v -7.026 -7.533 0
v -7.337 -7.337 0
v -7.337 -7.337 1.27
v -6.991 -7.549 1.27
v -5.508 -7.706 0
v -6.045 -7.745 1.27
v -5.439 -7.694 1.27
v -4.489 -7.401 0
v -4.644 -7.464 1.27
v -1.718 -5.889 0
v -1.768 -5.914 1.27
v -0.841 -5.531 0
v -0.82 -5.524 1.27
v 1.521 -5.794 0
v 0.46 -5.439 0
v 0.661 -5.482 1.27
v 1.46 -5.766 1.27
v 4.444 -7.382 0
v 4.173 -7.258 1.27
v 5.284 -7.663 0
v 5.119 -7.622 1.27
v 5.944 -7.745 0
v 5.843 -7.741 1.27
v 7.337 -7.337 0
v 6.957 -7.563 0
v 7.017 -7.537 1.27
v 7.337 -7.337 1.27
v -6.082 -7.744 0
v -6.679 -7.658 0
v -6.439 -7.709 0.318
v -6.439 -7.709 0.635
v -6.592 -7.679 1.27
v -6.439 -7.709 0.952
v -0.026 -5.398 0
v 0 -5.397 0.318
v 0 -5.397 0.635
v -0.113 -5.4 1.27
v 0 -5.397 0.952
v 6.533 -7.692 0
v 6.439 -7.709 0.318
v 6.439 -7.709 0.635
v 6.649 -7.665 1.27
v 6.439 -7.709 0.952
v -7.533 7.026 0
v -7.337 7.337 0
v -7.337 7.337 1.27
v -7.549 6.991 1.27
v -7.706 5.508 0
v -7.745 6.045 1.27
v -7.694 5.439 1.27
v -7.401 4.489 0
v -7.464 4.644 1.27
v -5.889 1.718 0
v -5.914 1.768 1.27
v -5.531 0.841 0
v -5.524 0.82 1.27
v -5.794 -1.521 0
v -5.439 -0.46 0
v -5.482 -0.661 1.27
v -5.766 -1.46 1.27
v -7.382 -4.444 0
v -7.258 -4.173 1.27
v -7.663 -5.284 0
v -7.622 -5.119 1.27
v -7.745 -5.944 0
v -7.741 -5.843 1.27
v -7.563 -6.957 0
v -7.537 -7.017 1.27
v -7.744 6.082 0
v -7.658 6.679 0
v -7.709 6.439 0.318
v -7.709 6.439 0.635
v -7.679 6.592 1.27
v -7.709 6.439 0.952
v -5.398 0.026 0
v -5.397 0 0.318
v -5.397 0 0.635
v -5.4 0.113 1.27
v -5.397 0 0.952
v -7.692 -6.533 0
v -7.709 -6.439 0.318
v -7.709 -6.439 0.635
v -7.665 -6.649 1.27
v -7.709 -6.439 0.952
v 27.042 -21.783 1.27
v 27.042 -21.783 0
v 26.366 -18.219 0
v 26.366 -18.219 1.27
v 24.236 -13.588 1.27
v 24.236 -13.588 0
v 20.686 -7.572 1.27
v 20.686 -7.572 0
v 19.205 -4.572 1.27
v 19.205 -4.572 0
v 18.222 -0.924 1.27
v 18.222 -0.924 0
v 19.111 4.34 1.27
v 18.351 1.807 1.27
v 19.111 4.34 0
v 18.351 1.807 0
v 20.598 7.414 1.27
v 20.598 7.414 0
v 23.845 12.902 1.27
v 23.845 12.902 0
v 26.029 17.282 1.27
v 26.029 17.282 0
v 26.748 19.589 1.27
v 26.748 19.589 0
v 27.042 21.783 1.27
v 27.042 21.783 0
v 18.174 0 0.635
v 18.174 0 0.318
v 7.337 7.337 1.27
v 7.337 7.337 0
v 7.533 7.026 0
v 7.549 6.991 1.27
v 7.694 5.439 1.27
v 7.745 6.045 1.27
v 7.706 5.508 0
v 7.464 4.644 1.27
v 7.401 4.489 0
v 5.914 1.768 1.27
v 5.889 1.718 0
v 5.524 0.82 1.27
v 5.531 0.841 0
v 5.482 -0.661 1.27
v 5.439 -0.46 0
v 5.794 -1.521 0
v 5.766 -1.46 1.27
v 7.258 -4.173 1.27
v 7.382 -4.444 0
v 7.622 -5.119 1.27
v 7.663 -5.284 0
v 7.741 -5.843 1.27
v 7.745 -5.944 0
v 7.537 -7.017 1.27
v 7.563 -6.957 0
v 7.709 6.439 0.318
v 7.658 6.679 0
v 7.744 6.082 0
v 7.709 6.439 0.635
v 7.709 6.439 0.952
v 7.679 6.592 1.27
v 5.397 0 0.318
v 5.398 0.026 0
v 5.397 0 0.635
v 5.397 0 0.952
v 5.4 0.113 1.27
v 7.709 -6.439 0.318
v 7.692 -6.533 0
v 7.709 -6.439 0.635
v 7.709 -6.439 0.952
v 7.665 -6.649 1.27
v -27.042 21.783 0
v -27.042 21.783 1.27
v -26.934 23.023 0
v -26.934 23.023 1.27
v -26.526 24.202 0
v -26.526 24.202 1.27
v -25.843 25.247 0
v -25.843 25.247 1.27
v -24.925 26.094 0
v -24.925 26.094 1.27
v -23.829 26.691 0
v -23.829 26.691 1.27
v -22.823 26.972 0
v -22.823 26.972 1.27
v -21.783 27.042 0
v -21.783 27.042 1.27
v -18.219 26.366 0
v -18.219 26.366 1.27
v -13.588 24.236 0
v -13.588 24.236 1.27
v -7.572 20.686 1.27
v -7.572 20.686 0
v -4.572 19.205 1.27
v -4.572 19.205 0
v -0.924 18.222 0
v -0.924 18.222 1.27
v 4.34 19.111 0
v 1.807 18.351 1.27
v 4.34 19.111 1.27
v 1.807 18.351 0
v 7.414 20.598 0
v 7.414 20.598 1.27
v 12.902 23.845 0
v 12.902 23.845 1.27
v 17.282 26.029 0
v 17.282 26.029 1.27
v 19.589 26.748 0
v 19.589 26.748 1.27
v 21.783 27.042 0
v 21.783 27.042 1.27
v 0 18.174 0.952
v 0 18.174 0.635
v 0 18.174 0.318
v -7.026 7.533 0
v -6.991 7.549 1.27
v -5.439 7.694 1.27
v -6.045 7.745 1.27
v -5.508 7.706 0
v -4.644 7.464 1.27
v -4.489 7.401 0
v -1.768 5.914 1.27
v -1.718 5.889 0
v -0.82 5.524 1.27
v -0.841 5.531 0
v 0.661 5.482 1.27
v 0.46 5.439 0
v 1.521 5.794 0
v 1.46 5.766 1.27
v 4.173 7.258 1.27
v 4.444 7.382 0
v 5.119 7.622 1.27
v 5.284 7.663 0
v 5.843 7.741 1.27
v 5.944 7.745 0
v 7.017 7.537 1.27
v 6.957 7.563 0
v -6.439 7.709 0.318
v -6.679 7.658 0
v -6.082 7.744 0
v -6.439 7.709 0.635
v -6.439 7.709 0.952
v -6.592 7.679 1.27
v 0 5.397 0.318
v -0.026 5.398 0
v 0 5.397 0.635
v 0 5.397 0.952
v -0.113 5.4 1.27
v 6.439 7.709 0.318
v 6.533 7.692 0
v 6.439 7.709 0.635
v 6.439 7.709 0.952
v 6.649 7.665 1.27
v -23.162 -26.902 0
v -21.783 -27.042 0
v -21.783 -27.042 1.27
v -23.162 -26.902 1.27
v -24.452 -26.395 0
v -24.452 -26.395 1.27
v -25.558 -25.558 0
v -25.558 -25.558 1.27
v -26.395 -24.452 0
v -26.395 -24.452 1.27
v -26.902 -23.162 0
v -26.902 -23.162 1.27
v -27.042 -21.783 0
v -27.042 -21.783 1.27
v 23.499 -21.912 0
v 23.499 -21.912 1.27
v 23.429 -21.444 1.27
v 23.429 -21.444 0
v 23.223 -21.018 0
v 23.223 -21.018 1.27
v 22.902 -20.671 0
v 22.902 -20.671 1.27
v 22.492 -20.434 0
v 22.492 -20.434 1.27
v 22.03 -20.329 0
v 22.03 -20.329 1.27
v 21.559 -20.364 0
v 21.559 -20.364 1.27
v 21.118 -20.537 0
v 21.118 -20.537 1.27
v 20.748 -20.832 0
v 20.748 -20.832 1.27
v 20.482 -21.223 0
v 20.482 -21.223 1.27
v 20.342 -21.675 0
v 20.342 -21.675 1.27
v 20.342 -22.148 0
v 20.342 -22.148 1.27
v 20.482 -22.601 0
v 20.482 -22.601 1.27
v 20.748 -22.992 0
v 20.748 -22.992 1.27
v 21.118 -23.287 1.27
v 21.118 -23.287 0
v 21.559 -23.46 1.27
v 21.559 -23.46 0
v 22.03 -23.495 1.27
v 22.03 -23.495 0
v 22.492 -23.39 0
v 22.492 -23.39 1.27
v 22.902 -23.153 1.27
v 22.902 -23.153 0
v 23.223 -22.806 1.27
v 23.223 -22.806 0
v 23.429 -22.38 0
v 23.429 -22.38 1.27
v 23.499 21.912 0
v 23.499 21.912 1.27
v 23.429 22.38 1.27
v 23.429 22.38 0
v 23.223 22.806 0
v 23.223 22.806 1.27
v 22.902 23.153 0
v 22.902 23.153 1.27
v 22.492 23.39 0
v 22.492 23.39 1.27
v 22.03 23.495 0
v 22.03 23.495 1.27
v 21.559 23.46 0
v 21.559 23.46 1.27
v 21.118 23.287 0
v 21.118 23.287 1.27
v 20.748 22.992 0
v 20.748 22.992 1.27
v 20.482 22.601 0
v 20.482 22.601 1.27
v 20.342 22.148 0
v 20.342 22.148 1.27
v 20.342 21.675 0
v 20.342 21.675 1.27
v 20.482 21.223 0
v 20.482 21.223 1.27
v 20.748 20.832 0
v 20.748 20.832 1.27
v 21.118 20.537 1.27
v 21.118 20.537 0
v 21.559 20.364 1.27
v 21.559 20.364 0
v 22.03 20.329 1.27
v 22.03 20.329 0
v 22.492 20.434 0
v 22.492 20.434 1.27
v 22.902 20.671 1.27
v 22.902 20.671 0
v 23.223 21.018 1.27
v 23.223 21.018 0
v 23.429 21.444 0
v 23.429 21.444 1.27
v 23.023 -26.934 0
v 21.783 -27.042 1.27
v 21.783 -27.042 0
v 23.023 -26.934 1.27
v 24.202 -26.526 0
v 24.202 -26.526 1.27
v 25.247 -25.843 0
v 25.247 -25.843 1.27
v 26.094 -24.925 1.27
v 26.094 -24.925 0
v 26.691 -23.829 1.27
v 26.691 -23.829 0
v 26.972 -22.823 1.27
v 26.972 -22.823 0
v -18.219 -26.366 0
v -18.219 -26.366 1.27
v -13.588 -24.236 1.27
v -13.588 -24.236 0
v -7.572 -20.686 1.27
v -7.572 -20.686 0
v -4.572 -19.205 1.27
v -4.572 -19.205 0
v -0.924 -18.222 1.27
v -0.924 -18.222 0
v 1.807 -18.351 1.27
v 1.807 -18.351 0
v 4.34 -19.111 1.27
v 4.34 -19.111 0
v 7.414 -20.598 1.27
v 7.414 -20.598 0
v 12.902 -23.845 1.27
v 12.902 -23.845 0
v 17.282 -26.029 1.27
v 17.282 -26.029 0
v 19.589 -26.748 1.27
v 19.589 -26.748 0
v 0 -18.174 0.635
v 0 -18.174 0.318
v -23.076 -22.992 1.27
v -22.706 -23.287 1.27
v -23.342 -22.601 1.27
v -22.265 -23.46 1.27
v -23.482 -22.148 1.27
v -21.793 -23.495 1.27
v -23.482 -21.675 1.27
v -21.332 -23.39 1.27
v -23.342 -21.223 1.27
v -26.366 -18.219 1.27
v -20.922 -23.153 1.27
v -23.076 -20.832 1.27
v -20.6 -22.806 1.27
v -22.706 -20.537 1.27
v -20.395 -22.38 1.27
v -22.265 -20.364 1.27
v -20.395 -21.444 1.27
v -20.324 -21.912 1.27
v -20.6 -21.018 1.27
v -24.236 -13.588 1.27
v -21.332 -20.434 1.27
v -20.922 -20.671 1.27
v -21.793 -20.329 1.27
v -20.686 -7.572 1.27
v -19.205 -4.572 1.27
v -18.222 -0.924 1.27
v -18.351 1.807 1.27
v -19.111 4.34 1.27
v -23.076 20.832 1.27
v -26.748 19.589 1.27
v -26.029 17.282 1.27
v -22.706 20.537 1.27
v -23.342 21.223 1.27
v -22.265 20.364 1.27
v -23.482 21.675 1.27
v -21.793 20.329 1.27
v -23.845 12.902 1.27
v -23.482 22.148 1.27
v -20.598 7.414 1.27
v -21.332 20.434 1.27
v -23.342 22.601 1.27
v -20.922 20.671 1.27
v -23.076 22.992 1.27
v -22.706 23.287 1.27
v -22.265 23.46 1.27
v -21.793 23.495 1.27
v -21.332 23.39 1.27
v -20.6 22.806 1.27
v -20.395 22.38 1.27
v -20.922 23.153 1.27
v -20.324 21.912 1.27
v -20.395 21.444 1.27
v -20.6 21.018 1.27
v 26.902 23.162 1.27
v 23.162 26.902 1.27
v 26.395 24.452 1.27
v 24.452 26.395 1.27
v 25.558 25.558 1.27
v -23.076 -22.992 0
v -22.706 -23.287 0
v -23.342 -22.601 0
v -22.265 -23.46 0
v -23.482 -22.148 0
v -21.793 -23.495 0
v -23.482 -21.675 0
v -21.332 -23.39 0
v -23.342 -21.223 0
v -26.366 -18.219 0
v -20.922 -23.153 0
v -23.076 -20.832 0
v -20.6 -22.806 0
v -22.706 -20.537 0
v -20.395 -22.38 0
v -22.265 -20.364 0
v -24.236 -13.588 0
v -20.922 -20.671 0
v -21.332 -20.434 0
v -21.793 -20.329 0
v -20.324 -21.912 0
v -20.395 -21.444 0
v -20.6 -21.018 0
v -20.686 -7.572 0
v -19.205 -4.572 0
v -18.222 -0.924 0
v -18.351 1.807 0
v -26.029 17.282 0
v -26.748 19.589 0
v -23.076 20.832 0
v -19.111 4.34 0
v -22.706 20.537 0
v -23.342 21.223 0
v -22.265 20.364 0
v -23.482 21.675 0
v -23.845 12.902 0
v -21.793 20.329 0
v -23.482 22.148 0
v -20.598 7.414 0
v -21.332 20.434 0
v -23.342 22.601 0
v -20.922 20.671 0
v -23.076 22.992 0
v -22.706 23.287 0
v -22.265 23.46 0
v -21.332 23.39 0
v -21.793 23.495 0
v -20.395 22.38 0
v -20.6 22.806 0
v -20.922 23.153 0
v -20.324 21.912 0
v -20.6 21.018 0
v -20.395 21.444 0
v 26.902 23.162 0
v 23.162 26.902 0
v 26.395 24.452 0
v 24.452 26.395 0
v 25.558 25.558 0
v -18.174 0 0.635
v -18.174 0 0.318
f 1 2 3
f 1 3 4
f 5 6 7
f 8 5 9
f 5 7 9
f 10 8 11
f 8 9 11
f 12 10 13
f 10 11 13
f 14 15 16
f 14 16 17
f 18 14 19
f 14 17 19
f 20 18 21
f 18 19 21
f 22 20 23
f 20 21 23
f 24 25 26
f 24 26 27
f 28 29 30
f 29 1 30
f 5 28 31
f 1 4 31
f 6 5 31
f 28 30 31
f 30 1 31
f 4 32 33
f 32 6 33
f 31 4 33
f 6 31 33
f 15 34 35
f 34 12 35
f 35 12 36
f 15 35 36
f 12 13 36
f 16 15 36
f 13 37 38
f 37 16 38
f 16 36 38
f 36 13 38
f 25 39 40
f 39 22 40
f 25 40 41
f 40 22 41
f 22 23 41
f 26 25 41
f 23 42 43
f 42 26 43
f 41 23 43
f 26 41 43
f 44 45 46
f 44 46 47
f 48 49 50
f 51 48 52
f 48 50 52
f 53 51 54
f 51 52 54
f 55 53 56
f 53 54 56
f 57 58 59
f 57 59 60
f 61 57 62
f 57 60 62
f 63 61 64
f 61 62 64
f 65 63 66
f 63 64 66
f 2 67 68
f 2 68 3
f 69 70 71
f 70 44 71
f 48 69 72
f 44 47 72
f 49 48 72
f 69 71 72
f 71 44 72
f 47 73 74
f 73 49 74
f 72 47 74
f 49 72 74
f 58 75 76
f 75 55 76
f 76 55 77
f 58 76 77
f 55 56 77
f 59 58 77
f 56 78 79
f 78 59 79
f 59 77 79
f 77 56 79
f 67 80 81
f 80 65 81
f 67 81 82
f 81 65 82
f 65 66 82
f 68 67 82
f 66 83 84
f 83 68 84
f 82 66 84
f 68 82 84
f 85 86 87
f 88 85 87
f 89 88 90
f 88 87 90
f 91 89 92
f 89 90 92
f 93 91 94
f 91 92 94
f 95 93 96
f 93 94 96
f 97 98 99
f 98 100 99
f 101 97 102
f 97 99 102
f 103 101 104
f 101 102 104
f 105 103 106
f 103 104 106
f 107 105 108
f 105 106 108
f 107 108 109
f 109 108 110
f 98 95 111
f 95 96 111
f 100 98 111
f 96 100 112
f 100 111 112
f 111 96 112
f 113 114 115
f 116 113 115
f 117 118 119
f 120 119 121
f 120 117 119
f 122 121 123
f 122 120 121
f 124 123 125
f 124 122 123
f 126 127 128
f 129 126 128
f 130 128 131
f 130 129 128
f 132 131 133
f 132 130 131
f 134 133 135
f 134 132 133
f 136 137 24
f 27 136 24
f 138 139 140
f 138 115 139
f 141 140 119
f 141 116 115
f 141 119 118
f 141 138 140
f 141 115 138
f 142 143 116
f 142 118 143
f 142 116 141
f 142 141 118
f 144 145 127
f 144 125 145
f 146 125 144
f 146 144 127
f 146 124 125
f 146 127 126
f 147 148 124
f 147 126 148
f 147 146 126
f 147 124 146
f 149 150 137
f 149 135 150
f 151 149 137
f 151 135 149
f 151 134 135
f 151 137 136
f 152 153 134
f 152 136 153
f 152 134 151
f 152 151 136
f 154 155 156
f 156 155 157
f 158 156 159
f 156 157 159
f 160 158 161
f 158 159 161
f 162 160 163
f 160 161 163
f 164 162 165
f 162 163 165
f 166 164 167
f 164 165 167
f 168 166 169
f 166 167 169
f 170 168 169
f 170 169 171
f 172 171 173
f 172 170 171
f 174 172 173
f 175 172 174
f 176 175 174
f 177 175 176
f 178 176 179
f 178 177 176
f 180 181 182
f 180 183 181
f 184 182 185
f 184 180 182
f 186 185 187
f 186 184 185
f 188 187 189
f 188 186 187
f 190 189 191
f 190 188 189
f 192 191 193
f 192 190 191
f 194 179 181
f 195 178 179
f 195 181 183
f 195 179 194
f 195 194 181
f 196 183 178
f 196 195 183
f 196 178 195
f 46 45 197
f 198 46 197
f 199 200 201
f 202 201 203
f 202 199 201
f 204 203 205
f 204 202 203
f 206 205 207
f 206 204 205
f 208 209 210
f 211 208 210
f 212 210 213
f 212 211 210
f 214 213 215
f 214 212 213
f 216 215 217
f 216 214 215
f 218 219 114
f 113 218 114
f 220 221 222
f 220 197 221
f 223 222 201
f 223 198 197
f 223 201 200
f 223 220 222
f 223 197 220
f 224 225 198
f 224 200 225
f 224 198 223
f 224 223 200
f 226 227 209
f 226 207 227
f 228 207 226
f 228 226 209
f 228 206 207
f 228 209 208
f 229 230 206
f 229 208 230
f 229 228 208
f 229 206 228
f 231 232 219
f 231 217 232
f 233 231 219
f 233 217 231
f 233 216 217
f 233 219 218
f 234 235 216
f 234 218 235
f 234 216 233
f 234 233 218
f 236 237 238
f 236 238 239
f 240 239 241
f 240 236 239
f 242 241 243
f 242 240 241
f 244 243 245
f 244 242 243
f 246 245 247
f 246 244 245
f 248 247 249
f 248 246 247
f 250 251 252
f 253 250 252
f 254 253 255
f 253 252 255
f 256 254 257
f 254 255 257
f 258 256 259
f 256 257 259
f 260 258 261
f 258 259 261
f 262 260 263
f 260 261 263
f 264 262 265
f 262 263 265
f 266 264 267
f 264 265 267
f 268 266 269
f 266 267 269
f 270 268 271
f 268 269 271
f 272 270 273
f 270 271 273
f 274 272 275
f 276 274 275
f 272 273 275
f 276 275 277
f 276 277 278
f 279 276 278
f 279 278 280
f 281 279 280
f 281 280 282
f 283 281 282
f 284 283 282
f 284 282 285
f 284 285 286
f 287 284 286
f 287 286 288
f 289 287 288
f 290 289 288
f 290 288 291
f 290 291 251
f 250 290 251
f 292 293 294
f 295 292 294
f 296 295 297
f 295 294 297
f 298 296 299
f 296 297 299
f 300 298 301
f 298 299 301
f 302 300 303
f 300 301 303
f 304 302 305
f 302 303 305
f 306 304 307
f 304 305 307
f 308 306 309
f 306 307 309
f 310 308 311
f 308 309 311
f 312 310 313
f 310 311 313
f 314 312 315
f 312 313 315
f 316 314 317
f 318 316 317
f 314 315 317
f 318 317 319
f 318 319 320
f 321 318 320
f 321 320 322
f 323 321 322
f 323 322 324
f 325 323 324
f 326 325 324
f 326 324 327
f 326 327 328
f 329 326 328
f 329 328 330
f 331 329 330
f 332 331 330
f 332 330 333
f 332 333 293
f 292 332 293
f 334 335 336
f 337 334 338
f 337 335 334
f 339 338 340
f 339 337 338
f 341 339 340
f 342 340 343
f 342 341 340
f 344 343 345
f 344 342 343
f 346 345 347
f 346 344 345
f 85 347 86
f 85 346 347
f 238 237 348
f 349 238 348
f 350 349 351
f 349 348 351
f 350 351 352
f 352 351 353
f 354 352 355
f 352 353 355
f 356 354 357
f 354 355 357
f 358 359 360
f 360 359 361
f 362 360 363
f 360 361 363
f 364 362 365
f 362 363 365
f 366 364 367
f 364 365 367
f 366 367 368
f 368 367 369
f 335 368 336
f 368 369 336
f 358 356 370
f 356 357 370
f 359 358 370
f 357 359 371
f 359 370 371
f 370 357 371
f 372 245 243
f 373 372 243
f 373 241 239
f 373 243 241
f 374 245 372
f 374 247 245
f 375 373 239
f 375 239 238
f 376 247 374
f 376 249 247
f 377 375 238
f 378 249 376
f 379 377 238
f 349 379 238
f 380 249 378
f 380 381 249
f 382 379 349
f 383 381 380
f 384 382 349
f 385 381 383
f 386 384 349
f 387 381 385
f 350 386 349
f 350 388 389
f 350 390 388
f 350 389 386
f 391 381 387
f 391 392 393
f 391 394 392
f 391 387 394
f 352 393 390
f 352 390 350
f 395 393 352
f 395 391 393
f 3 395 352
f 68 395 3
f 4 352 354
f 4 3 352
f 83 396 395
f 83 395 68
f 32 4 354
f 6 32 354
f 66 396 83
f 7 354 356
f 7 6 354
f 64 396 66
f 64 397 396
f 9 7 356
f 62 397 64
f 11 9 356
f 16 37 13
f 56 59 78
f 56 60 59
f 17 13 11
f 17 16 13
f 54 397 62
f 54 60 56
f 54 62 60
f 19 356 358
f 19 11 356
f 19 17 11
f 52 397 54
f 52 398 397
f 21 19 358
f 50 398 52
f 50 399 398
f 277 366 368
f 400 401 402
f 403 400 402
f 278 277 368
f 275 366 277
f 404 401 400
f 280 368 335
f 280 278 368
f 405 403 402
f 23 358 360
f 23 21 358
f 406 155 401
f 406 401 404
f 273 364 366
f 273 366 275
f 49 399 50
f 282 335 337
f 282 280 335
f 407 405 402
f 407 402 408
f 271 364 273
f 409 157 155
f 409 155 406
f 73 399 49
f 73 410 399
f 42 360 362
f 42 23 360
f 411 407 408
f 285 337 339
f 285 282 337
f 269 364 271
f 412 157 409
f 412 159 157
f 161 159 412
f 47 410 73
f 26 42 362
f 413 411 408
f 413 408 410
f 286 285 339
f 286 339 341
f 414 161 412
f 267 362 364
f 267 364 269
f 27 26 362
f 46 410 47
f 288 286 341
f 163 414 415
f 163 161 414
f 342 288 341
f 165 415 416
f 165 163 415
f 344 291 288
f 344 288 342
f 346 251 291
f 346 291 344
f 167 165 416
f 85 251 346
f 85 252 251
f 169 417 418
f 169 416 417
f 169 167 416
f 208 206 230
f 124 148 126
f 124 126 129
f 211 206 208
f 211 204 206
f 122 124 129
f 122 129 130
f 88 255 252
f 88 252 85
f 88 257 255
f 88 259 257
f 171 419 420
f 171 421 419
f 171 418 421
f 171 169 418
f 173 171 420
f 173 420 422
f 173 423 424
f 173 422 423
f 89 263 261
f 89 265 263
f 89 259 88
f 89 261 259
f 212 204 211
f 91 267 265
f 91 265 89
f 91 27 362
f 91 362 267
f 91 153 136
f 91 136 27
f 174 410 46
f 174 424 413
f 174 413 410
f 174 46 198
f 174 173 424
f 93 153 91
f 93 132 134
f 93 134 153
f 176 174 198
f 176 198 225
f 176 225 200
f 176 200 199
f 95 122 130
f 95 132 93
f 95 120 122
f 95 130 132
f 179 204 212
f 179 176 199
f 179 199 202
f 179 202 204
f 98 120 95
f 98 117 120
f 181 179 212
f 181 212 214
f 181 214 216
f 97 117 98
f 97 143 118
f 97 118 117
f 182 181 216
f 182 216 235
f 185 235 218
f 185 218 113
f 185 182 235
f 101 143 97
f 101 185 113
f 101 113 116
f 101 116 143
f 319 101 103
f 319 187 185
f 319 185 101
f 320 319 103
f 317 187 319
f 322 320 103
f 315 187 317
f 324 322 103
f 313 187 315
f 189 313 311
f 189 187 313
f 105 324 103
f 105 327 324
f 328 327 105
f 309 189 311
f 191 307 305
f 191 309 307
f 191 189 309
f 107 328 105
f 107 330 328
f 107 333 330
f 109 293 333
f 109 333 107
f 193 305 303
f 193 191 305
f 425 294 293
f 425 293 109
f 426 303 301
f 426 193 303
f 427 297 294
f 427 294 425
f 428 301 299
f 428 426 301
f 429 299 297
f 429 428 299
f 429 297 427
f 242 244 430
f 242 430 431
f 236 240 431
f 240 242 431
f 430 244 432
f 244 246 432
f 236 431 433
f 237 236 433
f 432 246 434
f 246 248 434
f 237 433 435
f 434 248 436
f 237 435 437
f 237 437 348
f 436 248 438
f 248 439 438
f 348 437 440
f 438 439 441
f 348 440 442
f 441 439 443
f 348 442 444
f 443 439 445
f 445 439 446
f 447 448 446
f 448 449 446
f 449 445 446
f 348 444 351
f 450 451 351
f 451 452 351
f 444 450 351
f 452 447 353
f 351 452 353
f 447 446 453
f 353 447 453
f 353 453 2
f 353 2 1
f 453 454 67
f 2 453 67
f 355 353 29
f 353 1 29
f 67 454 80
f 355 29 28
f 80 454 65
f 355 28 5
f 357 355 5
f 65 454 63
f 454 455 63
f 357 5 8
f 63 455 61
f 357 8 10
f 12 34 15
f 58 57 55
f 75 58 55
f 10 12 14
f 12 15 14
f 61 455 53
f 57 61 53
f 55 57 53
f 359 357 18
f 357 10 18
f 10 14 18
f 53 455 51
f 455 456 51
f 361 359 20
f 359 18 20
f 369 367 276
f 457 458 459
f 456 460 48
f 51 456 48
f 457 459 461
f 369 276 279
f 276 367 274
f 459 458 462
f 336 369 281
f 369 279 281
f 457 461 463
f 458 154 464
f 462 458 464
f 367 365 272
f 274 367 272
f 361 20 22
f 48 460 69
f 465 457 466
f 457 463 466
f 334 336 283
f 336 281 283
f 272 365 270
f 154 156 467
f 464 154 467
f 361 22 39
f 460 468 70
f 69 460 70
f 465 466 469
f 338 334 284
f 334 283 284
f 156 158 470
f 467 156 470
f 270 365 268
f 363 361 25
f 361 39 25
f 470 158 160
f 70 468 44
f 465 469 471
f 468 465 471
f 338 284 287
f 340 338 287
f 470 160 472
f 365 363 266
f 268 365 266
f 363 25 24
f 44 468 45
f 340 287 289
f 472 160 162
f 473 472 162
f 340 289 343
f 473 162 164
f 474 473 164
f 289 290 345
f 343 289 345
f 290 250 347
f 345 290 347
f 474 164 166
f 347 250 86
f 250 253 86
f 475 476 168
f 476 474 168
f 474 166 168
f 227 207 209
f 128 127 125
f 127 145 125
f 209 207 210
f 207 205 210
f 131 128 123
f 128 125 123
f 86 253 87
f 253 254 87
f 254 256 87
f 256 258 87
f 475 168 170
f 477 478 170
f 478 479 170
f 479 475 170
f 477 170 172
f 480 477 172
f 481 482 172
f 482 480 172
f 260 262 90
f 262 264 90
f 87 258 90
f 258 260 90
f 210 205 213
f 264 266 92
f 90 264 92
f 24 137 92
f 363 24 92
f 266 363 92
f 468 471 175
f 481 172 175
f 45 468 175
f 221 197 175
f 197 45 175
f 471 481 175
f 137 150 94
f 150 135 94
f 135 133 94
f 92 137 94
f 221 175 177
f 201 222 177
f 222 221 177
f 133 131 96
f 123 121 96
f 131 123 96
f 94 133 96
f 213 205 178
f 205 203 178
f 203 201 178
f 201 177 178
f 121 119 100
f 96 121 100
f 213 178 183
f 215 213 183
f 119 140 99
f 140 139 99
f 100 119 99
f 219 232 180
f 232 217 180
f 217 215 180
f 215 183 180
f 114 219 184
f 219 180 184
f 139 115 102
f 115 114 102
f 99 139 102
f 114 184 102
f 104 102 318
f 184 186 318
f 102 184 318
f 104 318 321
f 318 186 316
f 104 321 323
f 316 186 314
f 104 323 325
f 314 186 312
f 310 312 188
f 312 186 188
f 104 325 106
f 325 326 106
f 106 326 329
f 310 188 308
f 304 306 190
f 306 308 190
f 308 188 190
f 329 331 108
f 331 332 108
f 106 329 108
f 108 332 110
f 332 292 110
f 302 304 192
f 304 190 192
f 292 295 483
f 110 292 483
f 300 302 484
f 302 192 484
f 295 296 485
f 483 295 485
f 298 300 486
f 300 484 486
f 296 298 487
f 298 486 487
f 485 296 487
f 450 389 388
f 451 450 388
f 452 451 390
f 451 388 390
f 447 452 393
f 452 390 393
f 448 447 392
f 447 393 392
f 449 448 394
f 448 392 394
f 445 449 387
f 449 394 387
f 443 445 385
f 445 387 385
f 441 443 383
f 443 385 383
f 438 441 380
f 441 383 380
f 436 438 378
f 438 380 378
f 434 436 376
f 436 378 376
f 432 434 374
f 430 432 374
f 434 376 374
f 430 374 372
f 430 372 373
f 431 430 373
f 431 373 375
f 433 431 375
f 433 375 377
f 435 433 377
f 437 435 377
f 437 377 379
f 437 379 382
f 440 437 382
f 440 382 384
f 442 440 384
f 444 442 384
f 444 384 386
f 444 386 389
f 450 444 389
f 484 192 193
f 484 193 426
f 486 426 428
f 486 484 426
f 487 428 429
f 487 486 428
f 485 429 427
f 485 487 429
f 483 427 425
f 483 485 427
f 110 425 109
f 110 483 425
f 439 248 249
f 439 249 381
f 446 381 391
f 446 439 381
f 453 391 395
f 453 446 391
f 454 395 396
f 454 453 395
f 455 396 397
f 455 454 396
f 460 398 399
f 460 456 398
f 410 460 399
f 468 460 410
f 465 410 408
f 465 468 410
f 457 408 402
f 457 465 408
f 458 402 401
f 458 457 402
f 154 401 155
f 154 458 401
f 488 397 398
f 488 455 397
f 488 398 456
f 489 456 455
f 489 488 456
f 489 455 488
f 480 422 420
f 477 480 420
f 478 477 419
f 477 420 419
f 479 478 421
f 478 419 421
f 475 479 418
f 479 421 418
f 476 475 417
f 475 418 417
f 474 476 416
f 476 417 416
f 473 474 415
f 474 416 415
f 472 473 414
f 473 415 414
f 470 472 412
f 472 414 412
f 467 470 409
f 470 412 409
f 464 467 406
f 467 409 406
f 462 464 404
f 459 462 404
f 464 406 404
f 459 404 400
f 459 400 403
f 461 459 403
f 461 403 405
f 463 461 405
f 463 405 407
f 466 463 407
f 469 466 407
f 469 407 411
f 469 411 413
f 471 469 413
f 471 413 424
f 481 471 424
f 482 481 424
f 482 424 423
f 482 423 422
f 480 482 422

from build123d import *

# Parameters (mm, degrees)
BOSS_EXTRUDE1_DEPTH = 1.27
FILLET1_START       = -1
FILLET1_DEPTH       = 3
FILLET2_START       = -1
FILLET2_DEPTH       = 3
FILLET3_R           = 5.08
FILLET4_R           = 5.08
SKETCH3_R           = 1.5875
CUT_EXTRUDE1_DEPTH  = 39.269062151


with BuildPart() as part:
    # Sketch1 → Boss-Extrude1 (new body)
    with BuildSketch(Plane.XY):
        with BuildLine():
            add(Edge.make_bspline(
                [(-26.078451224, -26.078451224), (-25.595030672, -26.46689269), (-16.201372292, -29.50543677), (0, -7.636650328), (16.201372291, -29.50543677), (25.595030672, -26.46689269), (26.078451224, -26.078451224)],
                knots=[0.032766754, 0.032766754, 0.032766754, 0.032766754, 0.065533508, 0.5, 0.934466492, 0.967233246, 0.967233246, 0.967233246, 0.967233246], degree=3))
            add(Edge.make_bspline(
                [(26.078451224, -26.078451224), (26.46689269, -25.595030672), (29.505436772, -16.201372289), (7.636650328, -2e-09), (29.505436768, 16.201372294), (26.46689269, 25.595030672), (26.078451224, 26.078451224)],
                knots=[0.032766754, 0.032766754, 0.032766754, 0.032766754, 0.065533508, 0.5, 0.934466492, 0.967233246, 0.967233246, 0.967233246, 0.967233246], degree=3))
            add(Edge.make_bspline(
                [(-26.078451224, 26.078451224), (-25.595030672, 26.46689269), (-16.201372292, 29.50543677), (0, 7.636650328), (16.201372291, 29.50543677), (25.595030672, 26.46689269), (26.078451224, 26.078451224)],
                knots=[0.032766754, 0.032766754, 0.032766754, 0.032766754, 0.065533508, 0.5, 0.934466492, 0.967233246, 0.967233246, 0.967233246, 0.967233246], degree=3))
            add(Edge.make_bspline(
                [(-26.078451224, -26.078451224), (-26.46689269, -25.595030672), (-29.50543677, -16.201372292), (-7.636650328, 0), (-29.50543677, 16.201372291), (-26.46689269, 25.595030672), (-26.078451224, 26.078451224)],
                knots=[0.032766754, 0.032766754, 0.032766754, 0.032766754, 0.065533508, 0.5, 0.934466492, 0.967233246, 0.967233246, 0.967233246, 0.967233246], degree=3))
        make_face()
    extrude(amount=BOSS_EXTRUDE1_DEPTH)

    # Fillet1: read off the stored shape, not the designer's step
    # Fillet1 outline → Fillet1 (cut)
    with BuildSketch(Plane.XY.offset(FILLET1_START)):
        with BuildLine():
            add(Edge.make_bspline(
                [(26.078451224, 26.078451224), (25.595030672, 26.46689269), (24.088787806, 26.954113447), (22.608220096, 27.071858625), (21.782533291, 27.042115453)],
                knots=[0.032766754, 0.032766754, 0.032766754, 0.032766754, 0.065533508, 0.1076861, 0.1076861, 0.1076861, 0.1076861], degree=3))
            ThreePointArc((21.782533291, 27.042115453), (25.557510624, 25.557510623), (27.042115452, 21.78253329))
            add(Edge.make_bspline(
                [(27.042115452, 21.78253329), (27.071858625, 22.608220095), (26.954113447, 24.088787806), (26.46689269, 25.595030672), (26.078451224, 26.078451224)],
                knots=[0.8923139, 0.8923139, 0.8923139, 0.8923139, 0.934466492, 0.967233246, 0.967233246, 0.967233246, 0.967233246], degree=3))
        make_face()
    extrude(amount=FILLET1_DEPTH, mode=Mode.SUBTRACT)

    # Fillet2: read off the stored shape, not the designer's step
    # Fillet2 outline → Fillet2 (cut)
    with BuildSketch(Plane.XY.offset(FILLET2_START)):
        with BuildLine():
            add(Edge.make_bspline(
                [(-26.078451224, -26.078451224), (-25.595030672, -26.46689269), (-24.088787806, -26.954113447), (-22.608220096, -27.071858625), (-21.782533291, -27.042115453)],
                knots=[0.032766754, 0.032766754, 0.032766754, 0.032766754, 0.065533508, 0.1076861, 0.1076861, 0.1076861, 0.1076861], degree=3))
            ThreePointArc((-21.782533291, -27.042115453), (-25.557510624, -25.557510624), (-27.042115453, -21.782533291))
            add(Edge.make_bspline(
                [(-27.042115453, -21.782533291), (-27.071858625, -22.608220096), (-26.954113447, -24.088787806), (-26.46689269, -25.595030672), (-26.078451224, -26.078451224)],
                knots=[0.8923139, 0.8923139, 0.8923139, 0.8923139, 0.934466492, 0.967233246, 0.967233246, 0.967233246, 0.967233246], degree=3))
        make_face()
    extrude(amount=FILLET2_DEPTH, mode=Mode.SUBTRACT)

    # Fillet3
    fillet3_edges = [part.edges().sort_by_distance(p)[0] for p in [
        (-26.078451224, 26.078451224, 0.635),
    ]]
    fillet(fillet3_edges, radius=FILLET3_R)

    # Fillet4
    fillet4_edges = [part.edges().sort_by_distance(p)[0] for p in [
        (26.078451224, -26.078451224, 0.635),
    ]]
    fillet(fillet4_edges, radius=FILLET4_R)

    # Sketch3 → Cut-Extrude1 (cut, through all)
    with BuildSketch(Plane.XY.offset(1.27)):
        with Locations((-21.911824935, 21.911824935)):
            Circle(SKETCH3_R)
        with Locations((21.911824935, 21.911824935)):
            Circle(SKETCH3_R)
        with Locations((21.911824935, -21.911824935)):
            Circle(SKETCH3_R)
        with Locations((-21.911824935, -21.911824935)):
            Circle(SKETCH3_R)
        with BuildLine():
            add(Edge.make_bspline(
                [(-7.336925612, -7.336925612), (-7.094564954, -7.539990493), (-4.441685448, -8.467510629), (0, -2.70941912), (4.441685448, -8.467510629), (7.094564954, -7.539990493), (7.336925612, -7.336925612)],
                knots=[0.055321023, 0.055321023, 0.055321023, 0.055321023, 0.110642047, 0.5, 0.889357953, 0.944678976, 0.944678976, 0.944678976, 0.944678976], degree=3))
            add(Edge.make_bspline(
                [(7.336925612, 7.336925612), (7.539990493, 7.094564954), (8.467510629, 4.441685448), (2.70941912, 0), (8.467510629, -4.441685448), (7.539990493, -7.094564954), (7.336925612, -7.336925612)],
                knots=[0.055321023, 0.055321023, 0.055321023, 0.055321023, 0.110642047, 0.5, 0.889357953, 0.944678977, 0.944678977, 0.944678977, 0.944678977], degree=3))
            add(Edge.make_bspline(
                [(-7.336925612, 7.336925612), (-7.094564954, 7.539990493), (-4.441685448, 8.467510629), (0, 2.70941912), (4.441685448, 8.467510629), (7.094564954, 7.539990493), (7.336925612, 7.336925612)],
                knots=[0.055321023, 0.055321023, 0.055321023, 0.055321023, 0.110642047, 0.5, 0.889357953, 0.944678977, 0.944678977, 0.944678977, 0.944678977], degree=3))
            add(Edge.make_bspline(
                [(-7.336925612, 7.336925612), (-7.539990493, 7.094564954), (-8.467510629, 4.441685448), (-2.70941912, 0), (-8.467510629, -4.441685448), (-7.539990493, -7.094564954), (-7.336925612, -7.336925612)],
                knots=[0.055321023, 0.055321023, 0.055321023, 0.055321023, 0.110642047, 0.5, 0.889357953, 0.944678977, 0.944678977, 0.944678977, 0.944678977], degree=3))
        make_face()
    extrude(amount=-CUT_EXTRUDE1_DEPTH, mode=Mode.SUBTRACT)


solid = part.part
